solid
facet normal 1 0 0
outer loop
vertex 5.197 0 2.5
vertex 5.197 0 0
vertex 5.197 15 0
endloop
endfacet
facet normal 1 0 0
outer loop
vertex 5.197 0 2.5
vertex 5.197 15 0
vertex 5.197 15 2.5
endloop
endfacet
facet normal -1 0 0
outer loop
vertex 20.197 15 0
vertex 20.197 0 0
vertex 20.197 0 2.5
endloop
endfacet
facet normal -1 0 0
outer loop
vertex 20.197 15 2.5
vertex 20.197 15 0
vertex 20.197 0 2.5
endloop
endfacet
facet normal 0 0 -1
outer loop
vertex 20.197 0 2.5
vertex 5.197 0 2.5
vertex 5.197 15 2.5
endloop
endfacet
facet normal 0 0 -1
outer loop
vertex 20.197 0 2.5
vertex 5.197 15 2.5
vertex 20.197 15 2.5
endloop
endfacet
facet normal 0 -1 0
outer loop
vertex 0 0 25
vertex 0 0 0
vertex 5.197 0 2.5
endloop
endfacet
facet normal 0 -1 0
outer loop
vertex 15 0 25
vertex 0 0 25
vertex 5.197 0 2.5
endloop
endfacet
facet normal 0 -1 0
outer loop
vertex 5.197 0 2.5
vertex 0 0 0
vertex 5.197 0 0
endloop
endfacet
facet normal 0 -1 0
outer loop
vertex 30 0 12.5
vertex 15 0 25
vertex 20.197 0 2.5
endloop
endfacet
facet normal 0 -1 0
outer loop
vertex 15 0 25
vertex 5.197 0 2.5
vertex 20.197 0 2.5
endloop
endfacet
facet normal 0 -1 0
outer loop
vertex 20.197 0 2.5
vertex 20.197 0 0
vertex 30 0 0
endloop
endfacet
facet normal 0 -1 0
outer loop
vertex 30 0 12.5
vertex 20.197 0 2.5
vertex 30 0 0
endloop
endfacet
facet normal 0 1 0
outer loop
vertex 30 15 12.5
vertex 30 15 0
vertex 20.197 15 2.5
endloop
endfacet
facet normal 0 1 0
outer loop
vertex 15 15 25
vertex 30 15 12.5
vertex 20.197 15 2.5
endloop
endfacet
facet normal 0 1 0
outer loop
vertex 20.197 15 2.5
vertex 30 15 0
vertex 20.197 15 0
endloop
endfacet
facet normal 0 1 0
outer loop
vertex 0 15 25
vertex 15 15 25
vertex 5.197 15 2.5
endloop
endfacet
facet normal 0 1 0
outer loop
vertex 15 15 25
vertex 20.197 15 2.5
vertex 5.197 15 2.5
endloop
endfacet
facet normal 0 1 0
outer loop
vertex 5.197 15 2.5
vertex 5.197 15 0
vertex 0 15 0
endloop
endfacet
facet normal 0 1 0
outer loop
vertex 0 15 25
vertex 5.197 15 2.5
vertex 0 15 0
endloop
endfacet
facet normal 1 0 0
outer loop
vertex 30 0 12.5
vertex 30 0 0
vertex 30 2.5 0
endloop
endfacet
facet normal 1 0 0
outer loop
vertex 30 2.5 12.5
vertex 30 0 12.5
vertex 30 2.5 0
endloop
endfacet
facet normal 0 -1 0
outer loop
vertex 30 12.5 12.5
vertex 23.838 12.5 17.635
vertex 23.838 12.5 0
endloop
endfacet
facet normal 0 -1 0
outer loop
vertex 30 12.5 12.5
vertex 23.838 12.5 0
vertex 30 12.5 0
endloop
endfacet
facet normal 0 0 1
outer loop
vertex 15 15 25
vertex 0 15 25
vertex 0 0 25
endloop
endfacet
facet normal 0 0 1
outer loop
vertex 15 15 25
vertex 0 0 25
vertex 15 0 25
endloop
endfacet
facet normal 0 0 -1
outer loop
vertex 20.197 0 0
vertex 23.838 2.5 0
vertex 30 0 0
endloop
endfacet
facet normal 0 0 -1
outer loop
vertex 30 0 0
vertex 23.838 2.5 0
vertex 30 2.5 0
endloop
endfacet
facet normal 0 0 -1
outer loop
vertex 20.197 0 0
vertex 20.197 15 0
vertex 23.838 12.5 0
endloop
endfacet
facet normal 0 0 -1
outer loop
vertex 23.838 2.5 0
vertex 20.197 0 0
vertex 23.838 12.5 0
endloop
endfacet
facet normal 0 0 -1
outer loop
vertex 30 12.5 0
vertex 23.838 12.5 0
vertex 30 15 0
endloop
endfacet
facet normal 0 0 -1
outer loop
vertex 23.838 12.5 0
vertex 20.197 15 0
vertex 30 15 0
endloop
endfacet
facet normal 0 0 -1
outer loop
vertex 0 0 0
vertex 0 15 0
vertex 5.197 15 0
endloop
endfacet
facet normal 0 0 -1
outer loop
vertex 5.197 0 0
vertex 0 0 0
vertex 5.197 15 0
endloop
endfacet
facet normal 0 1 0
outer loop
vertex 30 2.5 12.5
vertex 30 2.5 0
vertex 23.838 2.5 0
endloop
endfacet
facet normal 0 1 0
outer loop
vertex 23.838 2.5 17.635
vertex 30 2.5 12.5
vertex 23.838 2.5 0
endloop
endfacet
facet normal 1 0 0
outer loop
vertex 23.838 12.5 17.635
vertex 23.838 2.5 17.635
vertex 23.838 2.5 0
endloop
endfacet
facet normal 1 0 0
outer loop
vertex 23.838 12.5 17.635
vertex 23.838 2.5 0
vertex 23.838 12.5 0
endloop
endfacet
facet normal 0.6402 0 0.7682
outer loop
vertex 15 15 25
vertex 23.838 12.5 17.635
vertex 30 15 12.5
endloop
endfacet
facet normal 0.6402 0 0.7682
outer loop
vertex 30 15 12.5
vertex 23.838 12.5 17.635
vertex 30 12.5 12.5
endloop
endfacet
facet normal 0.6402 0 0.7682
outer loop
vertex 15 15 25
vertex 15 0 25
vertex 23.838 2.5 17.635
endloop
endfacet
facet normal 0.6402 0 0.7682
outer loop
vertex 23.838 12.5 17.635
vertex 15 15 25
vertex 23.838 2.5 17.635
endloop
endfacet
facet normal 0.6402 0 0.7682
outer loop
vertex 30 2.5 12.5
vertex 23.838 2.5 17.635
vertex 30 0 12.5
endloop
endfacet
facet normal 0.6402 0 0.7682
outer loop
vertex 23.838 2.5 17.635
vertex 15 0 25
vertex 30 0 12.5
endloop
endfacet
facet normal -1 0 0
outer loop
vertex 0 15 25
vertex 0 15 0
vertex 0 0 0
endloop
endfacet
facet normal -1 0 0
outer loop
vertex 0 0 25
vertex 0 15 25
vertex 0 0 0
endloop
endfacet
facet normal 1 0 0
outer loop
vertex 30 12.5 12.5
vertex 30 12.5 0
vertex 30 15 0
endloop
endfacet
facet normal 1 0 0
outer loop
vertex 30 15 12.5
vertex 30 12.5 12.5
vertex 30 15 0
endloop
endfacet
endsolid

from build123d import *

# Parameters (mm, degrees)
F1_DEPTH = 25
F3_DEPTH = 25
F4_W     = 15
F4_H     = 2.5
F5_DEPTH = 25


with BuildPart() as f1:
    # F0 (on Top) → F1 (new body)
    with BuildSketch(Plane.XY):
        Polygon((0, 15), (0, 0), (30, 0), (30, 2.5), (23.83784, 2.5), (23.83784, 12.5), (30, 12.5), (30, 15), align=None)
    extrude(amount=F1_DEPTH)

    # F2 (on face) → F3 (cut)
    with BuildSketch(Plane.XZ):
        Polygon((30, 25), (15, 25), (30, 12.5), align=None)
    extrude(amount=-F3_DEPTH, mode=Mode.SUBTRACT)

    # F4 (on face) → F5 (cut)
    with BuildSketch(Plane.XZ):
        with Locations((12.69743, 1.25)):
            Rectangle(F4_W, F4_H)
    extrude(amount=-F5_DEPTH, mode=Mode.SUBTRACT)


solid = f1.part
